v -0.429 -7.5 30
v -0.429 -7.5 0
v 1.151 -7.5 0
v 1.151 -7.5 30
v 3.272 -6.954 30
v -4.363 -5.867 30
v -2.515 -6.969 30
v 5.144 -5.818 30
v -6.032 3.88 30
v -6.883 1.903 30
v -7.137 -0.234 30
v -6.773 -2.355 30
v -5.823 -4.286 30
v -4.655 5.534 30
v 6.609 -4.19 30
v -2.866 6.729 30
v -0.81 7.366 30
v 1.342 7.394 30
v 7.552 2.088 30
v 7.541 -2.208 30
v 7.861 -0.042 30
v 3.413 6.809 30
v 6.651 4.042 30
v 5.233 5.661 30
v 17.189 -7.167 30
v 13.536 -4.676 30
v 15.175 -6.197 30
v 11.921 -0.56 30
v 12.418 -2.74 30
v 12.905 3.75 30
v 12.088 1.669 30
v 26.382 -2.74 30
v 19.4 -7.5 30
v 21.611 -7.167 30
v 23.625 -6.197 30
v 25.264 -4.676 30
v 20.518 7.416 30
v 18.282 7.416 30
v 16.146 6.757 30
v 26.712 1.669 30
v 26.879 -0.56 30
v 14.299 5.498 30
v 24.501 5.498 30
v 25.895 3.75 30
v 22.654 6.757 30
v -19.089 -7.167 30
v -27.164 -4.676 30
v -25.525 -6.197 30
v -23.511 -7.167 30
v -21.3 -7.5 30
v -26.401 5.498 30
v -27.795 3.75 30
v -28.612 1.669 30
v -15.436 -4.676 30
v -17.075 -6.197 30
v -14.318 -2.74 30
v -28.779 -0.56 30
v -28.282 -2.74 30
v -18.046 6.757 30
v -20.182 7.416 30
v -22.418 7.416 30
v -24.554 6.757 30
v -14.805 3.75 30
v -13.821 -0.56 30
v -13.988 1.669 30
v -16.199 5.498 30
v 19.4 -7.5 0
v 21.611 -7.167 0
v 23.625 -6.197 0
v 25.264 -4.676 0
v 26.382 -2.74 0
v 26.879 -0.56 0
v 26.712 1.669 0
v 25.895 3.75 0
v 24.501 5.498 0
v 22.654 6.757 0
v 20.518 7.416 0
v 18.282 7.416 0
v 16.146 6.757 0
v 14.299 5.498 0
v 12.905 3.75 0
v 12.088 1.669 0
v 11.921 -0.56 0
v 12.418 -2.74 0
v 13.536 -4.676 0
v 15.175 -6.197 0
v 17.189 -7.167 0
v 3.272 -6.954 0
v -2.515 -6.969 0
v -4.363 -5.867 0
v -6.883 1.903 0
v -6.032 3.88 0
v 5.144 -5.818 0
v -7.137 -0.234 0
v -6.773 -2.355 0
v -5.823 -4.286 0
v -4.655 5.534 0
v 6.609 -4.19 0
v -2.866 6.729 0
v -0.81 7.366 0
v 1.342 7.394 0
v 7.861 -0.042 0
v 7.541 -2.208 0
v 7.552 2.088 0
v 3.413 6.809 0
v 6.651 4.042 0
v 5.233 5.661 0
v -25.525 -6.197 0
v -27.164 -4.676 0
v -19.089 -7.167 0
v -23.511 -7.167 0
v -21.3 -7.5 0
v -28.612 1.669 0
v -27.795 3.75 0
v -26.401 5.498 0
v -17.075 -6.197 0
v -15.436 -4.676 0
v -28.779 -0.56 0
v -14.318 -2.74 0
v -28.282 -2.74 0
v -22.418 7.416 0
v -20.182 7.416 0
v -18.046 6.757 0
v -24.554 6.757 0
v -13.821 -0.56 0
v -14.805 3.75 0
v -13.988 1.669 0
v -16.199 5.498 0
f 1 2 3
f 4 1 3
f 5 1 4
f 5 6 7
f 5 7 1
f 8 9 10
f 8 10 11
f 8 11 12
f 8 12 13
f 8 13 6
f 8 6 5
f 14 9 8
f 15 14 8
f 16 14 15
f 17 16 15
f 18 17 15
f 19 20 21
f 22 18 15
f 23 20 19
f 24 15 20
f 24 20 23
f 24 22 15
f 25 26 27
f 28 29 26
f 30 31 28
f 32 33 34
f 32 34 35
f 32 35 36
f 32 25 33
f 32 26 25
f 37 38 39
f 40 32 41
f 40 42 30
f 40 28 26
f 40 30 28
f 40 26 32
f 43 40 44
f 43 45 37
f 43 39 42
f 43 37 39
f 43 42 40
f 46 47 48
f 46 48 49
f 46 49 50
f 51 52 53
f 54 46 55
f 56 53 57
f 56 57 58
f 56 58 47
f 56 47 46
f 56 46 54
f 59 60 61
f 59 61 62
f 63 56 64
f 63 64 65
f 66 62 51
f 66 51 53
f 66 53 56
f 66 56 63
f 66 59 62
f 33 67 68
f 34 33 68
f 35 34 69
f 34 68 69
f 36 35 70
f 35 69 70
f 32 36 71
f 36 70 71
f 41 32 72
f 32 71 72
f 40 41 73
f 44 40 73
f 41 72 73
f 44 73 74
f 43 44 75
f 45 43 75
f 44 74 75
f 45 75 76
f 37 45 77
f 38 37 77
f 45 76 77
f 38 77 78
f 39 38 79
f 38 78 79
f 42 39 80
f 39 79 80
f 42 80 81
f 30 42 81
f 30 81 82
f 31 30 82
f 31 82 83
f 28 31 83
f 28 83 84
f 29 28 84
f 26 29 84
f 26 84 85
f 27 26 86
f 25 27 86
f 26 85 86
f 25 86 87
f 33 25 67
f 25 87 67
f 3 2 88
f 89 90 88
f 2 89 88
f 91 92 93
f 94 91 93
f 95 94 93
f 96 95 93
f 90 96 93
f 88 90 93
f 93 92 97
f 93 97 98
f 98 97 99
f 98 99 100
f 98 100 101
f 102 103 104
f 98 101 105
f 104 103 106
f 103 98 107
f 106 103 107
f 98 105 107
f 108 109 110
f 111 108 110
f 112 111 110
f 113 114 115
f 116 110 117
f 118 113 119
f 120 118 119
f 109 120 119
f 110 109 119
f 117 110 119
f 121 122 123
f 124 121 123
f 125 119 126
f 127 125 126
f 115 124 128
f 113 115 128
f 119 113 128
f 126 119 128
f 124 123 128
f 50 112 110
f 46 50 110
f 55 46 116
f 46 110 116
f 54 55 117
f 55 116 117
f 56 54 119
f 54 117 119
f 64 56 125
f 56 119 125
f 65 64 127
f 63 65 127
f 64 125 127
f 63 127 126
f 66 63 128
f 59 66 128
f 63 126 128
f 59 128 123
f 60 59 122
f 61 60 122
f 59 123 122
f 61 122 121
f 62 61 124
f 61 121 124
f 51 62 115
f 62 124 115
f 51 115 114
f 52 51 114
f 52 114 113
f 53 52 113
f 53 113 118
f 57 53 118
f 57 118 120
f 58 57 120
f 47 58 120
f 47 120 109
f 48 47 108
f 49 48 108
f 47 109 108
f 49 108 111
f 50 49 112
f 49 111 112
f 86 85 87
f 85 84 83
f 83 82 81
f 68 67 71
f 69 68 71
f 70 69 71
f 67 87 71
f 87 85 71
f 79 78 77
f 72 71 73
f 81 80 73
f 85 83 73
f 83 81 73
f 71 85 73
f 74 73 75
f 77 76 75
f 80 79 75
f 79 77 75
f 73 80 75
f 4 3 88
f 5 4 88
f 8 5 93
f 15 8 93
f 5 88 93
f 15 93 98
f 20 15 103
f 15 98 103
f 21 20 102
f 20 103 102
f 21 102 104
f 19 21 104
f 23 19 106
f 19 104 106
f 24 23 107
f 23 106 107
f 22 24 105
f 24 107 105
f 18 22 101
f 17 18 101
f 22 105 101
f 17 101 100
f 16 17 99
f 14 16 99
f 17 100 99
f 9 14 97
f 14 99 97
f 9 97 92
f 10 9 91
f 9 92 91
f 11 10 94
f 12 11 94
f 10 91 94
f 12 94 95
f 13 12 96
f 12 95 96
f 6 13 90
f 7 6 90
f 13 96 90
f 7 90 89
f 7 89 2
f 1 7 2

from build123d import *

# Parameters (mm, degrees)
F1_DEPTH = 30


# Not quite as in the source:
# - the program builds the solid bodies; features that only make, move or delete a surface that nothing else refers to are left out


with BuildPart() as f1:
    # F0 (on Top) → F1 (new body)
    with BuildSketch(Plane.XY):
        with BuildLine():
            ThreePointArc((26.8999968469, 0), (24.7032977058, 5.3033008589), (19.3999968469, 7.5))
            ThreePointArc((19.3999968469, 7.5), (11.8999968469, 0), (19.3999968469, -7.5))
            ThreePointArc((19.3999968469, -7.5), (24.7032977058, -5.3033008589), (26.8999968469, 0))
        make_face()
    extrude(amount=F1_DEPTH)


with BuildPart() as f1b:
    # F0 (on Top) → F1, piece 2 (new body)
    with BuildSketch(Plane.XY):
        with BuildLine():
            ThreePointArc((-13.8000029325, 0), (-15.9967020736, 5.3033008589), (-21.3000029325, 7.5))
            ThreePointArc((-21.3000029325, 7.5), (-28.8000029325, 0), (-21.3000029325, -7.5))
            ThreePointArc((-21.3000029325, -7.5), (-15.9967020736, -5.3033008589), (-13.8000029325, 0))
        make_face()
    extrude(amount=F1_DEPTH)


with BuildPart() as f1c:
    # F0 (on Top) → F1, piece 3 (new body)
    with BuildSketch(Plane.XY):
        with BuildLine():
            Line((-0.4291974003, -7.5), (1.1508829887, -7.5))
            ThreePointArc((1.1508829887, -7.5), (5.9364728688, -5.0579356316), (7.8608427942, -0.0417269766))
            ThreePointArc((7.8608427942, -0.0417269766), (-4.6553658608, 5.533903098), (-0.4291974003, -7.5))
        make_face()
    extrude(amount=F1_DEPTH)


solid = Compound([f1.part, f1b.part, f1c.part])
